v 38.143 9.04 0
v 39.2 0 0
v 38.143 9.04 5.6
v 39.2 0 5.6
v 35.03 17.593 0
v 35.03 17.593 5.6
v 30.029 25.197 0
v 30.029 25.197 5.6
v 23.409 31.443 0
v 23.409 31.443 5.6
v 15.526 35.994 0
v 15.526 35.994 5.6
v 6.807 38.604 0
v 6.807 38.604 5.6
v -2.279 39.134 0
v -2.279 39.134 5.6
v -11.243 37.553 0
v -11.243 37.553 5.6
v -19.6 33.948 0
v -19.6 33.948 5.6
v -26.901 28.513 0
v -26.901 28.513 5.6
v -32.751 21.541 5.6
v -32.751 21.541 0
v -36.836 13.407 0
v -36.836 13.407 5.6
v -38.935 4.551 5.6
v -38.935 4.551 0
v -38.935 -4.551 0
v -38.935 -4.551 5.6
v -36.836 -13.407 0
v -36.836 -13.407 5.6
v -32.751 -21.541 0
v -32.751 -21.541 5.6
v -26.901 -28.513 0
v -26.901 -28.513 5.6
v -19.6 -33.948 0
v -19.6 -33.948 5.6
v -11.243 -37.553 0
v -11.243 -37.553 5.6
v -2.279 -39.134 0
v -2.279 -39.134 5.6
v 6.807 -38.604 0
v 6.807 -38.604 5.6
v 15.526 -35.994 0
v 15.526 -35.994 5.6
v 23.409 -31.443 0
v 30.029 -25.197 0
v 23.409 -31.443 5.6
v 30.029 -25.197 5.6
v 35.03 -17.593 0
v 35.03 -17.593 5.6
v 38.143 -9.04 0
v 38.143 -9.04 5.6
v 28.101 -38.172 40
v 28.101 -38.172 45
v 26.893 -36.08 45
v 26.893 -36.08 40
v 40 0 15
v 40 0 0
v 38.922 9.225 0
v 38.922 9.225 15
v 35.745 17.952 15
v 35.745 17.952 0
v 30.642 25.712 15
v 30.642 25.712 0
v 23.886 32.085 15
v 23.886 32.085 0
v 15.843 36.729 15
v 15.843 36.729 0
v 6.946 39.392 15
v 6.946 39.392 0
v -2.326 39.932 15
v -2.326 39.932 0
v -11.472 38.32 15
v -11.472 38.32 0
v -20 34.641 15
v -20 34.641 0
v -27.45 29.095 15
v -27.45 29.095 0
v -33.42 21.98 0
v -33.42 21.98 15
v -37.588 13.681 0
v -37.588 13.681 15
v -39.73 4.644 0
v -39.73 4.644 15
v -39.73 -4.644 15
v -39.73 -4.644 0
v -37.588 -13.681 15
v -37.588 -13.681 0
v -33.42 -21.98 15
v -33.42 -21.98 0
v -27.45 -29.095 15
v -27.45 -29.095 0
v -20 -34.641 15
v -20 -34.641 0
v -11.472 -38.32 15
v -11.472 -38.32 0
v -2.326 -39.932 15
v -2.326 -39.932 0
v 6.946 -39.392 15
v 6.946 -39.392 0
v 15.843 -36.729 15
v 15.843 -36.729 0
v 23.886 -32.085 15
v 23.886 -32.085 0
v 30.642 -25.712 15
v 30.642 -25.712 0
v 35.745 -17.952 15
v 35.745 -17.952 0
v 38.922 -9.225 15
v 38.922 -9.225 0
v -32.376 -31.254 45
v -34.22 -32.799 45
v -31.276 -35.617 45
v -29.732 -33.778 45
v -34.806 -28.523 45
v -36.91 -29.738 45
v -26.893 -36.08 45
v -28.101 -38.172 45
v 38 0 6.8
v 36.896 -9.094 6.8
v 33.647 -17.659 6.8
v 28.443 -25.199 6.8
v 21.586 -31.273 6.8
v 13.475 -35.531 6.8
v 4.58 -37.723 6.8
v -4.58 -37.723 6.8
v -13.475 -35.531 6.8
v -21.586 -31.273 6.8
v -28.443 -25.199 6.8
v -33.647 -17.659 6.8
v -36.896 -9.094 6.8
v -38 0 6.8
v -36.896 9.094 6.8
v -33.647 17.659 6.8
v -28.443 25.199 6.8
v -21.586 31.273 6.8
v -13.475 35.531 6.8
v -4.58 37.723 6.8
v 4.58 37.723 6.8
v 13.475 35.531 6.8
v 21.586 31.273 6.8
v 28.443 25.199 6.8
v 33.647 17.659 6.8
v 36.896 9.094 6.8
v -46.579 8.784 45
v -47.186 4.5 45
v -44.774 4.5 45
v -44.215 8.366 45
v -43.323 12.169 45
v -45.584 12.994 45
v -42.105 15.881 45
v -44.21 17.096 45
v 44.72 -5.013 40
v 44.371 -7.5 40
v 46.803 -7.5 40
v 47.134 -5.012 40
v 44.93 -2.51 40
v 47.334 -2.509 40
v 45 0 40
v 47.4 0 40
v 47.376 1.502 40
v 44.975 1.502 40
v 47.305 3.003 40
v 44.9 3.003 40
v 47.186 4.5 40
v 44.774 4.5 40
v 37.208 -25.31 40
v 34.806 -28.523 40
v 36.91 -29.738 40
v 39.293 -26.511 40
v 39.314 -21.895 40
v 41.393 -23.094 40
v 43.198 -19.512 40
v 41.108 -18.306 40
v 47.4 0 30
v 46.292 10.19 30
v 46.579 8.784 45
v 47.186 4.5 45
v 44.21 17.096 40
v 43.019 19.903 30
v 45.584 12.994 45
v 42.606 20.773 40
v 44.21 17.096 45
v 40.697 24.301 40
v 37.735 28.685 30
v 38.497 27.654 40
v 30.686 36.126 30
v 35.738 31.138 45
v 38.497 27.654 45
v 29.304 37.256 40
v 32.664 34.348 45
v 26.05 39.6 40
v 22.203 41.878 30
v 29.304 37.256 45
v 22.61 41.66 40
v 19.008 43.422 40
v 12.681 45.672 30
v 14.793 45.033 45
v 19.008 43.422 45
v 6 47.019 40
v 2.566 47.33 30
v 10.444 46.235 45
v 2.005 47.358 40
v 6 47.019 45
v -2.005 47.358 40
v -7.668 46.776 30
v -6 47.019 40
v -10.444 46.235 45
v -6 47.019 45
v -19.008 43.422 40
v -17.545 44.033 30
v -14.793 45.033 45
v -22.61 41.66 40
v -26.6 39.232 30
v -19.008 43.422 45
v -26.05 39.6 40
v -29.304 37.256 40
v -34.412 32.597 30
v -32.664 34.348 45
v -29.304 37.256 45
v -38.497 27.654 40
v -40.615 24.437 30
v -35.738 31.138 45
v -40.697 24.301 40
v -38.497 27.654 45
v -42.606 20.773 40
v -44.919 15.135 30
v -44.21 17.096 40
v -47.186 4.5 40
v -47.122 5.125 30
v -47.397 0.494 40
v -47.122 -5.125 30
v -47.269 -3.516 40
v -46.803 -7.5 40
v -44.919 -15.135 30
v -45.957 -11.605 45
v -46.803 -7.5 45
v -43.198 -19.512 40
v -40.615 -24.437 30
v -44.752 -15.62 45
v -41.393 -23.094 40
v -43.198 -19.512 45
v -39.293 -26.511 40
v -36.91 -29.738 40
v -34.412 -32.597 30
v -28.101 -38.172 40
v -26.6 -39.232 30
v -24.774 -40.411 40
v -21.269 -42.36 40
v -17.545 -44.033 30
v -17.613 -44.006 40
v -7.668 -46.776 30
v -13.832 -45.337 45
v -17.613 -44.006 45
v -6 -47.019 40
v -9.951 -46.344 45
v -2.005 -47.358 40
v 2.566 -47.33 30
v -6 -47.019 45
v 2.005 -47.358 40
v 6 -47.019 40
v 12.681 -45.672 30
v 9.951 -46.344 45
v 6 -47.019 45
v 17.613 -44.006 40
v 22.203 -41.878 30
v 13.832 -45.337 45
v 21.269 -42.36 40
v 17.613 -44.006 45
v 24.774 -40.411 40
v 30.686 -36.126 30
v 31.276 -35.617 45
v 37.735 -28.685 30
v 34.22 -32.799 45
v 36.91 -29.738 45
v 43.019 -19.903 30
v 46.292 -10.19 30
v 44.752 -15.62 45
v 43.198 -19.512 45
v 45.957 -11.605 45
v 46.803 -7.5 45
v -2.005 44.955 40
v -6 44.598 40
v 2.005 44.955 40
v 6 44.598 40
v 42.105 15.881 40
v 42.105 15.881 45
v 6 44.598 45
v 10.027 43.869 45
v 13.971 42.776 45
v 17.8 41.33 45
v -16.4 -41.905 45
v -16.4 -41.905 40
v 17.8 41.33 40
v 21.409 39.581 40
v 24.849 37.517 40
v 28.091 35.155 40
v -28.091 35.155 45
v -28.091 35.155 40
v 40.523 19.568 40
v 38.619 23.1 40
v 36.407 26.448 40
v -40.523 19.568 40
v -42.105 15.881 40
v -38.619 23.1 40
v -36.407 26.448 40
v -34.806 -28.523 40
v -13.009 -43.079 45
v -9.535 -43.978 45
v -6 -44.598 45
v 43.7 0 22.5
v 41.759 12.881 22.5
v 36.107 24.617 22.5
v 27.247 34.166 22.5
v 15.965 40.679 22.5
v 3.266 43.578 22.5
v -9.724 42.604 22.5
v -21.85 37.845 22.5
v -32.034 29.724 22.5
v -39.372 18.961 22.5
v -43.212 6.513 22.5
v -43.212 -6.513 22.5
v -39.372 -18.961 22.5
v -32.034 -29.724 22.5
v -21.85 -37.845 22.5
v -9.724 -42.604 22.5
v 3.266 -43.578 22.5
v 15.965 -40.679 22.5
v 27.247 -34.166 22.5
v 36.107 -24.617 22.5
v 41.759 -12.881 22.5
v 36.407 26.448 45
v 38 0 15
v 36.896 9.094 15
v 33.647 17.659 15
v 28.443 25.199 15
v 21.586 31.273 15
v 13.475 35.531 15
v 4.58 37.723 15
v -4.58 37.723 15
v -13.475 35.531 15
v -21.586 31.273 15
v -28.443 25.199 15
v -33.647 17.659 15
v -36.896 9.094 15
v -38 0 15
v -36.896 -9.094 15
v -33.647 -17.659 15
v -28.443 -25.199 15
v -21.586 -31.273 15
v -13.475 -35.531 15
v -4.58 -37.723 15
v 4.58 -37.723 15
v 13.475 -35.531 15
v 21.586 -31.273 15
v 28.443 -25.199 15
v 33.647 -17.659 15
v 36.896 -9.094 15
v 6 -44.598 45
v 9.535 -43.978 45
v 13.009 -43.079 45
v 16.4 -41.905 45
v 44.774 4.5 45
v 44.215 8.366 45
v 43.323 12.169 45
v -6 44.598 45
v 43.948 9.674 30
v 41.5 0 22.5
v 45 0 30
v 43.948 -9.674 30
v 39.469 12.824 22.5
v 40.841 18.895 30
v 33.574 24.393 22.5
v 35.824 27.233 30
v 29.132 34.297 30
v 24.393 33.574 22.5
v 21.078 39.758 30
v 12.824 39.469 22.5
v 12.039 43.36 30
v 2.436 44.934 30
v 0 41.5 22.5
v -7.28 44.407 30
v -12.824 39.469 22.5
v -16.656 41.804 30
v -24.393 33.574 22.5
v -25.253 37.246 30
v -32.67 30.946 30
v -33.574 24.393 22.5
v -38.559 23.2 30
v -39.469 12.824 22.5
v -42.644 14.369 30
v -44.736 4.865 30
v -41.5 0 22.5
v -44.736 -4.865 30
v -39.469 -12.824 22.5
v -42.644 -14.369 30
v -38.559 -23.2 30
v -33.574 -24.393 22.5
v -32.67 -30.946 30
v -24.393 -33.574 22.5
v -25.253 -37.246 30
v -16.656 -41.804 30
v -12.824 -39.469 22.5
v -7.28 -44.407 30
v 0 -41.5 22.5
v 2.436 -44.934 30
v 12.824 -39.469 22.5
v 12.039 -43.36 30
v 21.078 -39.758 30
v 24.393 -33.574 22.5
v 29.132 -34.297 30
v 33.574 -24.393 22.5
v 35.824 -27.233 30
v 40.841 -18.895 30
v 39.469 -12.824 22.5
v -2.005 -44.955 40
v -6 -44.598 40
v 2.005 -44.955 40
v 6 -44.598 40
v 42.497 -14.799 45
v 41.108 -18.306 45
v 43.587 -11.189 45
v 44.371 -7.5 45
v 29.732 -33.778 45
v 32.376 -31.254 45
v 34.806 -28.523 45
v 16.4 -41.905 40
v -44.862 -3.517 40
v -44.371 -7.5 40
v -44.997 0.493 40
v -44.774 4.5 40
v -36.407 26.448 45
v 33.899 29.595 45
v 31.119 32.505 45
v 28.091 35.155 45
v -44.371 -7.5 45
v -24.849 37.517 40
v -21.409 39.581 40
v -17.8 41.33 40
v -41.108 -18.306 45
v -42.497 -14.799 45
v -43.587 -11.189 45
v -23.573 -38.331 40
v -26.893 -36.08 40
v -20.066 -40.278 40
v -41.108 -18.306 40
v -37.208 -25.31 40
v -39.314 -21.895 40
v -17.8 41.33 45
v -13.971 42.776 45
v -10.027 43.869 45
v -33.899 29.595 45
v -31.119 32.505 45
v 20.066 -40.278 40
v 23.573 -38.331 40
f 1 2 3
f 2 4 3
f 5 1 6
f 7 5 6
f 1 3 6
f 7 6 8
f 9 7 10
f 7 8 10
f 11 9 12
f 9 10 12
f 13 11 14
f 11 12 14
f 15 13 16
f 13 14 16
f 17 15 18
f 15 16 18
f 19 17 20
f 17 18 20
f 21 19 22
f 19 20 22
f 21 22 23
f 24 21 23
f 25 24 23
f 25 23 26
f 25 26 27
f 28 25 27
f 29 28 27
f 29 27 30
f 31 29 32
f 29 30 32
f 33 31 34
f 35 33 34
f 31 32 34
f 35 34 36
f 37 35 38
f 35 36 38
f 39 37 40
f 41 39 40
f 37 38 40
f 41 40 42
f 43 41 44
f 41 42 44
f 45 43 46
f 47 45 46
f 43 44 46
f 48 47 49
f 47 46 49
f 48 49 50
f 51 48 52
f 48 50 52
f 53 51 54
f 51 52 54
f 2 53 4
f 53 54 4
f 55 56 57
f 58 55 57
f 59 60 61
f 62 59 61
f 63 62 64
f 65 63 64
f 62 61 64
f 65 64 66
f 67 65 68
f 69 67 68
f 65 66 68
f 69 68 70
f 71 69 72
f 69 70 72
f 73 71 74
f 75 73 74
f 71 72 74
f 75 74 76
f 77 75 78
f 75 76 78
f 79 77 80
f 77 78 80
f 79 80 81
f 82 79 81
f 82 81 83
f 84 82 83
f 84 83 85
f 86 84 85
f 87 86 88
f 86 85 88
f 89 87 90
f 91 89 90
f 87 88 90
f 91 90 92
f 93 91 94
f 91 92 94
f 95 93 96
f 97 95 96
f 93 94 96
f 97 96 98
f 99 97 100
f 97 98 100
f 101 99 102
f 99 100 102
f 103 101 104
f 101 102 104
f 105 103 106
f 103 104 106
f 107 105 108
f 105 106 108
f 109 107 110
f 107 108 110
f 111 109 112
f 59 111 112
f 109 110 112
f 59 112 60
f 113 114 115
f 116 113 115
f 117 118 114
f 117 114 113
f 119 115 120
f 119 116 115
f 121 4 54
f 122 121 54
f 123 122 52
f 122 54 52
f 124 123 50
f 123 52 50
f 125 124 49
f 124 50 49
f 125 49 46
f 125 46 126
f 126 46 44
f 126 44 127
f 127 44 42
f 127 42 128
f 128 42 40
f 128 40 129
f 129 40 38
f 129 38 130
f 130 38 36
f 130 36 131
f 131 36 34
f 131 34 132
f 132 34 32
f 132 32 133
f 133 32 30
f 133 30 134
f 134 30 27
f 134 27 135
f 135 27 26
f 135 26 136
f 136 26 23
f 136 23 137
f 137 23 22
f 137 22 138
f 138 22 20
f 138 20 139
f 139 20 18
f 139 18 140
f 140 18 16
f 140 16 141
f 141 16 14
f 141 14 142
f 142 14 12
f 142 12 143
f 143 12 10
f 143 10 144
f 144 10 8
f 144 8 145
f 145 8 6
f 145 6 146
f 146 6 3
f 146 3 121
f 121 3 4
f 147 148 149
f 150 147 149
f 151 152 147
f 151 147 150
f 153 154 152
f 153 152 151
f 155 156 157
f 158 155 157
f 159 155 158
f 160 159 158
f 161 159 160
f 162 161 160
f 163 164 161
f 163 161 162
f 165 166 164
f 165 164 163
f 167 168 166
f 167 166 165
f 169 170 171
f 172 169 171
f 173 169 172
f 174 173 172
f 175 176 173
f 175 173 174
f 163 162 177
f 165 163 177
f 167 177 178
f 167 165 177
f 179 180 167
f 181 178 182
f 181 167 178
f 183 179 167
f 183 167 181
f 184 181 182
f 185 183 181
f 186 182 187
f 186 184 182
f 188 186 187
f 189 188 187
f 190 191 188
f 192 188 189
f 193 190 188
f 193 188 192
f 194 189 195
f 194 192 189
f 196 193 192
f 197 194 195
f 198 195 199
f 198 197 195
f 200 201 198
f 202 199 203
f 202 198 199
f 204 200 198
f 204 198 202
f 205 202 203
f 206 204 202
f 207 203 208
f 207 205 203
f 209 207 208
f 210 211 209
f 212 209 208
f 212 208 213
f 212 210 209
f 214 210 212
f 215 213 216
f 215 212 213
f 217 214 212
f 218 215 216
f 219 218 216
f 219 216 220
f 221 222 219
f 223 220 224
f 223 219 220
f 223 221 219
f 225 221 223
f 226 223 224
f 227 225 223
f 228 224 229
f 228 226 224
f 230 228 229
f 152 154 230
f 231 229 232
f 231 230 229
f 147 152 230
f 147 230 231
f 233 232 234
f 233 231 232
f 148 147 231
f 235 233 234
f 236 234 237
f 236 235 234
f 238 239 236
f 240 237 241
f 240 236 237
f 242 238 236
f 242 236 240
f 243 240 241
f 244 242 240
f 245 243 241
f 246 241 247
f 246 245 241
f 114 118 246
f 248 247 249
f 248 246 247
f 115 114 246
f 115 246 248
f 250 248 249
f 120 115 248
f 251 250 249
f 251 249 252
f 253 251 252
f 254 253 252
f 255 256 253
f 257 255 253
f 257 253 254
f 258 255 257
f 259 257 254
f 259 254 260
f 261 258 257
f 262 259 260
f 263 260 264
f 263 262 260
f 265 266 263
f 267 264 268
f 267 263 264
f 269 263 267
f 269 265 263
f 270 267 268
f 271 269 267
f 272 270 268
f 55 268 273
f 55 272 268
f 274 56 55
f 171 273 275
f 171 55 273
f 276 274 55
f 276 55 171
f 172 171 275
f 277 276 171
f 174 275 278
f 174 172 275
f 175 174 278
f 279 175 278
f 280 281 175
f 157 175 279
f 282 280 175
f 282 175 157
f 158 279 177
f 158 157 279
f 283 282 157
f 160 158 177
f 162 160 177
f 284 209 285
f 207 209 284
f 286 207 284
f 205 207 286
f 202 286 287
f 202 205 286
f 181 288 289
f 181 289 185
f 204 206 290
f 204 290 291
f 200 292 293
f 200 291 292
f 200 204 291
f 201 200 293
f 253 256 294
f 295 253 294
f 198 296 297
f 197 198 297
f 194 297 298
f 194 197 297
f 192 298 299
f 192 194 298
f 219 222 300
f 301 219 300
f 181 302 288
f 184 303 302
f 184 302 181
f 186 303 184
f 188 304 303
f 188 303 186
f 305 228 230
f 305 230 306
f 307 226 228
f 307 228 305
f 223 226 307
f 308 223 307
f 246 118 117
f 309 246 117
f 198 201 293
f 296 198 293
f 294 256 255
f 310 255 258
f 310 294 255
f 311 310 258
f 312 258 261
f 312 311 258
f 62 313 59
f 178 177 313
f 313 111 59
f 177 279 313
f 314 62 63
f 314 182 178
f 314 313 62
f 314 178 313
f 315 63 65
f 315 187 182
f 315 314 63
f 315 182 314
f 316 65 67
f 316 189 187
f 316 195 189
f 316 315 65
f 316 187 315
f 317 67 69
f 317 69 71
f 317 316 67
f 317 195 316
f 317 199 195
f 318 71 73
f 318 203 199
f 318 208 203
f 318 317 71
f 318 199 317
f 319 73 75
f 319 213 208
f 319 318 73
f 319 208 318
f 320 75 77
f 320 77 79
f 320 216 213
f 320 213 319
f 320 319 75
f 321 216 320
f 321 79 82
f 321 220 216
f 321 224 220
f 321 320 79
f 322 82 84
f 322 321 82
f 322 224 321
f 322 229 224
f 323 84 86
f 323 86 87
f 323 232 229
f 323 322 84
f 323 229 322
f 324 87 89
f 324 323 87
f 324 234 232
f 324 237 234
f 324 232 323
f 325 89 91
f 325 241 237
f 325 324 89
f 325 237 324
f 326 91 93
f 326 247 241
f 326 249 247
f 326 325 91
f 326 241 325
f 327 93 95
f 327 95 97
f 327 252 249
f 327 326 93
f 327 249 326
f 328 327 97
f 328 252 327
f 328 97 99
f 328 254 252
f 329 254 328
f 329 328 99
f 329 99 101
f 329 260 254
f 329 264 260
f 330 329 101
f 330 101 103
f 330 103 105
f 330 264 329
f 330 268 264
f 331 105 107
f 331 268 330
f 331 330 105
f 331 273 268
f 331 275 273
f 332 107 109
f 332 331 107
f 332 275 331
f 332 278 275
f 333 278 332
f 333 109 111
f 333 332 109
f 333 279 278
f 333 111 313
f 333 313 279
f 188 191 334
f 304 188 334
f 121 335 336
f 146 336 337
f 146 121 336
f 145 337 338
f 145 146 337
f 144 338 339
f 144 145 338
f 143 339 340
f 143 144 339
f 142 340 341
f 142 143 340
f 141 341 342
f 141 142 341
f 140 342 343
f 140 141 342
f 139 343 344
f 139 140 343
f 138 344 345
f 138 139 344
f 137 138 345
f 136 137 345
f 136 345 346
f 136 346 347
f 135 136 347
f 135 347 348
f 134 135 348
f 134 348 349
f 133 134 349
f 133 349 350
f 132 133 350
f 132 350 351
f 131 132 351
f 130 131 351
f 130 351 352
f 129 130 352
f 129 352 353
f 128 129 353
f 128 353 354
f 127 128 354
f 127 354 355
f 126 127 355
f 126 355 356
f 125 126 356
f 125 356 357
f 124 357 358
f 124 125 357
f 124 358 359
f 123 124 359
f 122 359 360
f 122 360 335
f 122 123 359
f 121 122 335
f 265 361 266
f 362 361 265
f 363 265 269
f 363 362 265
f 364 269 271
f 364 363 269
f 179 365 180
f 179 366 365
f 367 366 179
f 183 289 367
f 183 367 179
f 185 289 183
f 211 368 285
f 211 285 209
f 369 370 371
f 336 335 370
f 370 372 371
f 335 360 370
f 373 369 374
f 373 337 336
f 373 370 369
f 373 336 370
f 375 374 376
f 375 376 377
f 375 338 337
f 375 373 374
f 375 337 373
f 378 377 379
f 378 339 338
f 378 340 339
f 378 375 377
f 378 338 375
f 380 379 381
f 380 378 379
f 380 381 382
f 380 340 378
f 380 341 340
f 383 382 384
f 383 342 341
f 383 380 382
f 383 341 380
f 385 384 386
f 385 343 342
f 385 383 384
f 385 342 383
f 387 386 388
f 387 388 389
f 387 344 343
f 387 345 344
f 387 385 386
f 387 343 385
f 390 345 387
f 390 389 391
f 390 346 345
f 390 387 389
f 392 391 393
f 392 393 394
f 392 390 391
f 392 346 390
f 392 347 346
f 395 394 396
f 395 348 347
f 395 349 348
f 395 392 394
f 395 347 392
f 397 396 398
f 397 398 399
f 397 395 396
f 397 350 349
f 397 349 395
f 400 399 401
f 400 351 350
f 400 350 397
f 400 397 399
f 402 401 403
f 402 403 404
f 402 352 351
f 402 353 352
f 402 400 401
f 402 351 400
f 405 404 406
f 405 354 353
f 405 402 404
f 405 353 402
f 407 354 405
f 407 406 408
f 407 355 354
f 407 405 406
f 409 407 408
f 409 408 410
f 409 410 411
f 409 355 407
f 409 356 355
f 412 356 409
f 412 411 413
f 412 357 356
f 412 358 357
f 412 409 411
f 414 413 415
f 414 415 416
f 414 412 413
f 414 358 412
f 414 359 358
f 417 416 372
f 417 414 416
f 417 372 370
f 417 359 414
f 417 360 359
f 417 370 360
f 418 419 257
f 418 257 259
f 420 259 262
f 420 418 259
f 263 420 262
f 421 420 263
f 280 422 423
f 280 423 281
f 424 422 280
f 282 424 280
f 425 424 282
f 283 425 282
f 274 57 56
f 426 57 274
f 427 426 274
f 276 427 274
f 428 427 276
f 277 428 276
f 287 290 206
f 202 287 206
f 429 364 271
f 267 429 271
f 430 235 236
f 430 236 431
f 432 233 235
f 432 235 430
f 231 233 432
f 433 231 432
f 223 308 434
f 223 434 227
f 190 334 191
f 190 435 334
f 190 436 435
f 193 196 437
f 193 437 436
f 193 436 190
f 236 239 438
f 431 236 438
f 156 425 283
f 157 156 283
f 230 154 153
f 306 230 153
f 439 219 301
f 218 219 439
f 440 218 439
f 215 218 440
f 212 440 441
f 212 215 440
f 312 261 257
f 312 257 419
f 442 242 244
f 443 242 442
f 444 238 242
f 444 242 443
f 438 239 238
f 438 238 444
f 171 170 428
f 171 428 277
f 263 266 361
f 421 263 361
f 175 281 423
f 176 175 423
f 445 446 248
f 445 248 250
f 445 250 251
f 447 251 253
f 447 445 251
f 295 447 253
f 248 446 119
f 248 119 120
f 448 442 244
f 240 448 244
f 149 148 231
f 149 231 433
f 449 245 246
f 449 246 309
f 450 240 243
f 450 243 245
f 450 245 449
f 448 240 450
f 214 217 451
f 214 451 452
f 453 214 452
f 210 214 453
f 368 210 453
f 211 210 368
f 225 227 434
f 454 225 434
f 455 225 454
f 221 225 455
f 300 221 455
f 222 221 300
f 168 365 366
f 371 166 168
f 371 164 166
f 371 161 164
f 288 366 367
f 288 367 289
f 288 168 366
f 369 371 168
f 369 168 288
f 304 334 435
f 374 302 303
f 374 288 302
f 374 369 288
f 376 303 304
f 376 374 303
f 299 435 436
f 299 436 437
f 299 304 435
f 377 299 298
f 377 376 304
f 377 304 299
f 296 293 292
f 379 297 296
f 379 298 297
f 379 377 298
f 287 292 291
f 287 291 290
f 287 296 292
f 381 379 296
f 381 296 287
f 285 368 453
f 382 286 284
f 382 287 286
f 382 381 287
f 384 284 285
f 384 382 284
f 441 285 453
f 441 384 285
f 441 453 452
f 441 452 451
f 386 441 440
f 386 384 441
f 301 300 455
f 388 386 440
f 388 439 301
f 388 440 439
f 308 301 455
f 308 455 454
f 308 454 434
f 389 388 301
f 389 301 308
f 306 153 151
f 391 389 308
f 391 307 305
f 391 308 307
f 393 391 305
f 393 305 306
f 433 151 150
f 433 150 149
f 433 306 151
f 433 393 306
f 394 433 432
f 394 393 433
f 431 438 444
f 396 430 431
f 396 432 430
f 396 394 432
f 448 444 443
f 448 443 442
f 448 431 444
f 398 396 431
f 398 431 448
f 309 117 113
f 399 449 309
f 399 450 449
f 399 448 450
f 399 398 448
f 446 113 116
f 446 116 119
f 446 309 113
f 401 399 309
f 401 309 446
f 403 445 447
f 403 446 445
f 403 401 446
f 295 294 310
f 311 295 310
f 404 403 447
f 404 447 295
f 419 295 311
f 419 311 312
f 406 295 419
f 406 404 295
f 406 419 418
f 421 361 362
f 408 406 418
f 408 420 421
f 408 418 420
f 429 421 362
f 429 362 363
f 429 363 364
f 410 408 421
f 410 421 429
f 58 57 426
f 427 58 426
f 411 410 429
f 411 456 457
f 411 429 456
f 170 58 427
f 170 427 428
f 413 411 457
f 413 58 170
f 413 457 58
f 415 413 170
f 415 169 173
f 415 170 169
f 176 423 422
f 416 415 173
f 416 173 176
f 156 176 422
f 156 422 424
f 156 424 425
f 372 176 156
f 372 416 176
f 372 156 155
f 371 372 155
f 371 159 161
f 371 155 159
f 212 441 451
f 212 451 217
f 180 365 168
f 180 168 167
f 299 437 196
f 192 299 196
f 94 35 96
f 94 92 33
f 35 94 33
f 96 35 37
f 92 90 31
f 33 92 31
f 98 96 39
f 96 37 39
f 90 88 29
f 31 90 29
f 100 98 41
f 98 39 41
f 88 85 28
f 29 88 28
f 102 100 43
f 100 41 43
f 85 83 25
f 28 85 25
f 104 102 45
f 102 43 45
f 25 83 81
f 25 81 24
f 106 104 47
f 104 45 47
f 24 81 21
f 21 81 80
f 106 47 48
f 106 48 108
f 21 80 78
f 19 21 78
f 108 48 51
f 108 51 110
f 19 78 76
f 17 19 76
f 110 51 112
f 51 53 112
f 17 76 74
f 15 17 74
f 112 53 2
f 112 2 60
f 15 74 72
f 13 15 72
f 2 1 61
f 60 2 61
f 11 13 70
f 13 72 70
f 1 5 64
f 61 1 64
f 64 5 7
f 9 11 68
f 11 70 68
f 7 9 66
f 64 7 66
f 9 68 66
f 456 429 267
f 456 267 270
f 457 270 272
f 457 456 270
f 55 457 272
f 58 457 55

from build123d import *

# Parameters (mm, degrees)
F0_R     = 40
F0_R_2   = 38
F1_DEPTH = 15
F2_W     = 2
F2_H     = 5.6
F5_W     = 12
F5_H     = 12
F6_DEPTH = 5
F7_SIZE  = 1.19999


# Not quite as in the source:
# - a fillet or chamfer is up to 0.001 mm smaller than in the source, because OpenCascade refuses the exact size


with BuildPart() as f1:
    # F0 (on Top) → F1 (new body)
    with BuildSketch(Plane.XY):
        Circle(F0_R)
        Circle(F0_R_2, mode=Mode.SUBTRACT)
    extrude(amount=F1_DEPTH)

    # F2 (on Front) → F3 (revolve, cut)
    with BuildSketch(Plane.XZ):
        with Locations((38.2, 2.8)):
            Rectangle(F2_W, F2_H)
        Polygon((45, 30), (38, 15), (40, 15), (47.4, 30), (47.4, 45), (45, 45), align=None)
    revolve(axis=Axis((0, 0, 15), (0, 0, 1)), mode=Mode.SUBTRACT)

    # F2 (on Front) → F4 (revolve)
    with BuildSketch(Plane.XZ):
        Polygon((45, 30), (38, 15), (40, 15), (47.4, 30), (47.4, 45), (45, 45), align=None)
    revolve(axis=Axis((0, 0, 15), (0, 0, 1)))

    # F5 (on face) → F6 (cut)
    with BuildSketch(Plane.XY.offset(45)):
        with Locations((0, 46)):
            Rectangle(F5_W, F5_H)
        Polygon((-15.5538475773, 37.4400542571), (-21.5538475773, 47.8323591025), (-31.9461524227, 41.8323591025), (-25.9461524227, 31.4400542571), align=None)
        Polygon((-32.9400542571, 24.4461524227), (-43.3323591025, 30.4461524227), (-49.3323591025, 20.0538475773), (-38.9400542571, 14.0538475773), align=None)
        with Locations((-47.5, -1.5)):
            Rectangle(F5_W, F5_H)
        Polygon((-38.9400542571, -17.0538475773), (-49.3323591025, -23.0538475773), (-43.3323591025, -33.4461524227), (-32.9400542571, -27.4461524227), align=None)
        Polygon((-25.9461524227, -34.4400542571), (-31.9461524227, -44.8323591025), (-21.5538475773, -50.8323591025), (-15.5538475773, -40.4400542571), align=None)
        with Locations((0, -49)):
            Rectangle(F5_W, F5_H)
        Polygon((15.5538475773, -40.4400542571), (21.5538475773, -50.8323591025), (31.9461524227, -44.8323591025), (25.9461524227, -34.4400542571), align=None)
        Polygon((32.9400542571, -27.4461524227), (43.3323591025, -33.4461524227), (49.3323591025, -23.0538475773), (38.9400542571, -17.0538475773), align=None)
        with Locations((47.5, -1.5)):
            Rectangle(F5_W, F5_H)
        Polygon((38.9400542571, 14.0538475773), (49.3323591025, 20.0538475773), (43.3323591025, 30.4461524227), (32.9400542571, 24.4461524227), align=None)
        Polygon((25.9461524227, 31.4400542571), (31.9461524227, 41.8323591025), (21.5538475773, 47.8323591025), (15.5538475773, 37.4400542571), align=None)
    extrude(amount=-F6_DEPTH, mode=Mode.SUBTRACT)

    # F7 (size 1.2 in the source; OpenCascade refuses exactly that, so slightly less here)
    f7_edges = [f1.edges().sort_by_distance(p)[0] for p in [
        (-38, 0, 5.6),
    ]]
    chamfer(f7_edges, length=F7_SIZE)


solid = f1.part
